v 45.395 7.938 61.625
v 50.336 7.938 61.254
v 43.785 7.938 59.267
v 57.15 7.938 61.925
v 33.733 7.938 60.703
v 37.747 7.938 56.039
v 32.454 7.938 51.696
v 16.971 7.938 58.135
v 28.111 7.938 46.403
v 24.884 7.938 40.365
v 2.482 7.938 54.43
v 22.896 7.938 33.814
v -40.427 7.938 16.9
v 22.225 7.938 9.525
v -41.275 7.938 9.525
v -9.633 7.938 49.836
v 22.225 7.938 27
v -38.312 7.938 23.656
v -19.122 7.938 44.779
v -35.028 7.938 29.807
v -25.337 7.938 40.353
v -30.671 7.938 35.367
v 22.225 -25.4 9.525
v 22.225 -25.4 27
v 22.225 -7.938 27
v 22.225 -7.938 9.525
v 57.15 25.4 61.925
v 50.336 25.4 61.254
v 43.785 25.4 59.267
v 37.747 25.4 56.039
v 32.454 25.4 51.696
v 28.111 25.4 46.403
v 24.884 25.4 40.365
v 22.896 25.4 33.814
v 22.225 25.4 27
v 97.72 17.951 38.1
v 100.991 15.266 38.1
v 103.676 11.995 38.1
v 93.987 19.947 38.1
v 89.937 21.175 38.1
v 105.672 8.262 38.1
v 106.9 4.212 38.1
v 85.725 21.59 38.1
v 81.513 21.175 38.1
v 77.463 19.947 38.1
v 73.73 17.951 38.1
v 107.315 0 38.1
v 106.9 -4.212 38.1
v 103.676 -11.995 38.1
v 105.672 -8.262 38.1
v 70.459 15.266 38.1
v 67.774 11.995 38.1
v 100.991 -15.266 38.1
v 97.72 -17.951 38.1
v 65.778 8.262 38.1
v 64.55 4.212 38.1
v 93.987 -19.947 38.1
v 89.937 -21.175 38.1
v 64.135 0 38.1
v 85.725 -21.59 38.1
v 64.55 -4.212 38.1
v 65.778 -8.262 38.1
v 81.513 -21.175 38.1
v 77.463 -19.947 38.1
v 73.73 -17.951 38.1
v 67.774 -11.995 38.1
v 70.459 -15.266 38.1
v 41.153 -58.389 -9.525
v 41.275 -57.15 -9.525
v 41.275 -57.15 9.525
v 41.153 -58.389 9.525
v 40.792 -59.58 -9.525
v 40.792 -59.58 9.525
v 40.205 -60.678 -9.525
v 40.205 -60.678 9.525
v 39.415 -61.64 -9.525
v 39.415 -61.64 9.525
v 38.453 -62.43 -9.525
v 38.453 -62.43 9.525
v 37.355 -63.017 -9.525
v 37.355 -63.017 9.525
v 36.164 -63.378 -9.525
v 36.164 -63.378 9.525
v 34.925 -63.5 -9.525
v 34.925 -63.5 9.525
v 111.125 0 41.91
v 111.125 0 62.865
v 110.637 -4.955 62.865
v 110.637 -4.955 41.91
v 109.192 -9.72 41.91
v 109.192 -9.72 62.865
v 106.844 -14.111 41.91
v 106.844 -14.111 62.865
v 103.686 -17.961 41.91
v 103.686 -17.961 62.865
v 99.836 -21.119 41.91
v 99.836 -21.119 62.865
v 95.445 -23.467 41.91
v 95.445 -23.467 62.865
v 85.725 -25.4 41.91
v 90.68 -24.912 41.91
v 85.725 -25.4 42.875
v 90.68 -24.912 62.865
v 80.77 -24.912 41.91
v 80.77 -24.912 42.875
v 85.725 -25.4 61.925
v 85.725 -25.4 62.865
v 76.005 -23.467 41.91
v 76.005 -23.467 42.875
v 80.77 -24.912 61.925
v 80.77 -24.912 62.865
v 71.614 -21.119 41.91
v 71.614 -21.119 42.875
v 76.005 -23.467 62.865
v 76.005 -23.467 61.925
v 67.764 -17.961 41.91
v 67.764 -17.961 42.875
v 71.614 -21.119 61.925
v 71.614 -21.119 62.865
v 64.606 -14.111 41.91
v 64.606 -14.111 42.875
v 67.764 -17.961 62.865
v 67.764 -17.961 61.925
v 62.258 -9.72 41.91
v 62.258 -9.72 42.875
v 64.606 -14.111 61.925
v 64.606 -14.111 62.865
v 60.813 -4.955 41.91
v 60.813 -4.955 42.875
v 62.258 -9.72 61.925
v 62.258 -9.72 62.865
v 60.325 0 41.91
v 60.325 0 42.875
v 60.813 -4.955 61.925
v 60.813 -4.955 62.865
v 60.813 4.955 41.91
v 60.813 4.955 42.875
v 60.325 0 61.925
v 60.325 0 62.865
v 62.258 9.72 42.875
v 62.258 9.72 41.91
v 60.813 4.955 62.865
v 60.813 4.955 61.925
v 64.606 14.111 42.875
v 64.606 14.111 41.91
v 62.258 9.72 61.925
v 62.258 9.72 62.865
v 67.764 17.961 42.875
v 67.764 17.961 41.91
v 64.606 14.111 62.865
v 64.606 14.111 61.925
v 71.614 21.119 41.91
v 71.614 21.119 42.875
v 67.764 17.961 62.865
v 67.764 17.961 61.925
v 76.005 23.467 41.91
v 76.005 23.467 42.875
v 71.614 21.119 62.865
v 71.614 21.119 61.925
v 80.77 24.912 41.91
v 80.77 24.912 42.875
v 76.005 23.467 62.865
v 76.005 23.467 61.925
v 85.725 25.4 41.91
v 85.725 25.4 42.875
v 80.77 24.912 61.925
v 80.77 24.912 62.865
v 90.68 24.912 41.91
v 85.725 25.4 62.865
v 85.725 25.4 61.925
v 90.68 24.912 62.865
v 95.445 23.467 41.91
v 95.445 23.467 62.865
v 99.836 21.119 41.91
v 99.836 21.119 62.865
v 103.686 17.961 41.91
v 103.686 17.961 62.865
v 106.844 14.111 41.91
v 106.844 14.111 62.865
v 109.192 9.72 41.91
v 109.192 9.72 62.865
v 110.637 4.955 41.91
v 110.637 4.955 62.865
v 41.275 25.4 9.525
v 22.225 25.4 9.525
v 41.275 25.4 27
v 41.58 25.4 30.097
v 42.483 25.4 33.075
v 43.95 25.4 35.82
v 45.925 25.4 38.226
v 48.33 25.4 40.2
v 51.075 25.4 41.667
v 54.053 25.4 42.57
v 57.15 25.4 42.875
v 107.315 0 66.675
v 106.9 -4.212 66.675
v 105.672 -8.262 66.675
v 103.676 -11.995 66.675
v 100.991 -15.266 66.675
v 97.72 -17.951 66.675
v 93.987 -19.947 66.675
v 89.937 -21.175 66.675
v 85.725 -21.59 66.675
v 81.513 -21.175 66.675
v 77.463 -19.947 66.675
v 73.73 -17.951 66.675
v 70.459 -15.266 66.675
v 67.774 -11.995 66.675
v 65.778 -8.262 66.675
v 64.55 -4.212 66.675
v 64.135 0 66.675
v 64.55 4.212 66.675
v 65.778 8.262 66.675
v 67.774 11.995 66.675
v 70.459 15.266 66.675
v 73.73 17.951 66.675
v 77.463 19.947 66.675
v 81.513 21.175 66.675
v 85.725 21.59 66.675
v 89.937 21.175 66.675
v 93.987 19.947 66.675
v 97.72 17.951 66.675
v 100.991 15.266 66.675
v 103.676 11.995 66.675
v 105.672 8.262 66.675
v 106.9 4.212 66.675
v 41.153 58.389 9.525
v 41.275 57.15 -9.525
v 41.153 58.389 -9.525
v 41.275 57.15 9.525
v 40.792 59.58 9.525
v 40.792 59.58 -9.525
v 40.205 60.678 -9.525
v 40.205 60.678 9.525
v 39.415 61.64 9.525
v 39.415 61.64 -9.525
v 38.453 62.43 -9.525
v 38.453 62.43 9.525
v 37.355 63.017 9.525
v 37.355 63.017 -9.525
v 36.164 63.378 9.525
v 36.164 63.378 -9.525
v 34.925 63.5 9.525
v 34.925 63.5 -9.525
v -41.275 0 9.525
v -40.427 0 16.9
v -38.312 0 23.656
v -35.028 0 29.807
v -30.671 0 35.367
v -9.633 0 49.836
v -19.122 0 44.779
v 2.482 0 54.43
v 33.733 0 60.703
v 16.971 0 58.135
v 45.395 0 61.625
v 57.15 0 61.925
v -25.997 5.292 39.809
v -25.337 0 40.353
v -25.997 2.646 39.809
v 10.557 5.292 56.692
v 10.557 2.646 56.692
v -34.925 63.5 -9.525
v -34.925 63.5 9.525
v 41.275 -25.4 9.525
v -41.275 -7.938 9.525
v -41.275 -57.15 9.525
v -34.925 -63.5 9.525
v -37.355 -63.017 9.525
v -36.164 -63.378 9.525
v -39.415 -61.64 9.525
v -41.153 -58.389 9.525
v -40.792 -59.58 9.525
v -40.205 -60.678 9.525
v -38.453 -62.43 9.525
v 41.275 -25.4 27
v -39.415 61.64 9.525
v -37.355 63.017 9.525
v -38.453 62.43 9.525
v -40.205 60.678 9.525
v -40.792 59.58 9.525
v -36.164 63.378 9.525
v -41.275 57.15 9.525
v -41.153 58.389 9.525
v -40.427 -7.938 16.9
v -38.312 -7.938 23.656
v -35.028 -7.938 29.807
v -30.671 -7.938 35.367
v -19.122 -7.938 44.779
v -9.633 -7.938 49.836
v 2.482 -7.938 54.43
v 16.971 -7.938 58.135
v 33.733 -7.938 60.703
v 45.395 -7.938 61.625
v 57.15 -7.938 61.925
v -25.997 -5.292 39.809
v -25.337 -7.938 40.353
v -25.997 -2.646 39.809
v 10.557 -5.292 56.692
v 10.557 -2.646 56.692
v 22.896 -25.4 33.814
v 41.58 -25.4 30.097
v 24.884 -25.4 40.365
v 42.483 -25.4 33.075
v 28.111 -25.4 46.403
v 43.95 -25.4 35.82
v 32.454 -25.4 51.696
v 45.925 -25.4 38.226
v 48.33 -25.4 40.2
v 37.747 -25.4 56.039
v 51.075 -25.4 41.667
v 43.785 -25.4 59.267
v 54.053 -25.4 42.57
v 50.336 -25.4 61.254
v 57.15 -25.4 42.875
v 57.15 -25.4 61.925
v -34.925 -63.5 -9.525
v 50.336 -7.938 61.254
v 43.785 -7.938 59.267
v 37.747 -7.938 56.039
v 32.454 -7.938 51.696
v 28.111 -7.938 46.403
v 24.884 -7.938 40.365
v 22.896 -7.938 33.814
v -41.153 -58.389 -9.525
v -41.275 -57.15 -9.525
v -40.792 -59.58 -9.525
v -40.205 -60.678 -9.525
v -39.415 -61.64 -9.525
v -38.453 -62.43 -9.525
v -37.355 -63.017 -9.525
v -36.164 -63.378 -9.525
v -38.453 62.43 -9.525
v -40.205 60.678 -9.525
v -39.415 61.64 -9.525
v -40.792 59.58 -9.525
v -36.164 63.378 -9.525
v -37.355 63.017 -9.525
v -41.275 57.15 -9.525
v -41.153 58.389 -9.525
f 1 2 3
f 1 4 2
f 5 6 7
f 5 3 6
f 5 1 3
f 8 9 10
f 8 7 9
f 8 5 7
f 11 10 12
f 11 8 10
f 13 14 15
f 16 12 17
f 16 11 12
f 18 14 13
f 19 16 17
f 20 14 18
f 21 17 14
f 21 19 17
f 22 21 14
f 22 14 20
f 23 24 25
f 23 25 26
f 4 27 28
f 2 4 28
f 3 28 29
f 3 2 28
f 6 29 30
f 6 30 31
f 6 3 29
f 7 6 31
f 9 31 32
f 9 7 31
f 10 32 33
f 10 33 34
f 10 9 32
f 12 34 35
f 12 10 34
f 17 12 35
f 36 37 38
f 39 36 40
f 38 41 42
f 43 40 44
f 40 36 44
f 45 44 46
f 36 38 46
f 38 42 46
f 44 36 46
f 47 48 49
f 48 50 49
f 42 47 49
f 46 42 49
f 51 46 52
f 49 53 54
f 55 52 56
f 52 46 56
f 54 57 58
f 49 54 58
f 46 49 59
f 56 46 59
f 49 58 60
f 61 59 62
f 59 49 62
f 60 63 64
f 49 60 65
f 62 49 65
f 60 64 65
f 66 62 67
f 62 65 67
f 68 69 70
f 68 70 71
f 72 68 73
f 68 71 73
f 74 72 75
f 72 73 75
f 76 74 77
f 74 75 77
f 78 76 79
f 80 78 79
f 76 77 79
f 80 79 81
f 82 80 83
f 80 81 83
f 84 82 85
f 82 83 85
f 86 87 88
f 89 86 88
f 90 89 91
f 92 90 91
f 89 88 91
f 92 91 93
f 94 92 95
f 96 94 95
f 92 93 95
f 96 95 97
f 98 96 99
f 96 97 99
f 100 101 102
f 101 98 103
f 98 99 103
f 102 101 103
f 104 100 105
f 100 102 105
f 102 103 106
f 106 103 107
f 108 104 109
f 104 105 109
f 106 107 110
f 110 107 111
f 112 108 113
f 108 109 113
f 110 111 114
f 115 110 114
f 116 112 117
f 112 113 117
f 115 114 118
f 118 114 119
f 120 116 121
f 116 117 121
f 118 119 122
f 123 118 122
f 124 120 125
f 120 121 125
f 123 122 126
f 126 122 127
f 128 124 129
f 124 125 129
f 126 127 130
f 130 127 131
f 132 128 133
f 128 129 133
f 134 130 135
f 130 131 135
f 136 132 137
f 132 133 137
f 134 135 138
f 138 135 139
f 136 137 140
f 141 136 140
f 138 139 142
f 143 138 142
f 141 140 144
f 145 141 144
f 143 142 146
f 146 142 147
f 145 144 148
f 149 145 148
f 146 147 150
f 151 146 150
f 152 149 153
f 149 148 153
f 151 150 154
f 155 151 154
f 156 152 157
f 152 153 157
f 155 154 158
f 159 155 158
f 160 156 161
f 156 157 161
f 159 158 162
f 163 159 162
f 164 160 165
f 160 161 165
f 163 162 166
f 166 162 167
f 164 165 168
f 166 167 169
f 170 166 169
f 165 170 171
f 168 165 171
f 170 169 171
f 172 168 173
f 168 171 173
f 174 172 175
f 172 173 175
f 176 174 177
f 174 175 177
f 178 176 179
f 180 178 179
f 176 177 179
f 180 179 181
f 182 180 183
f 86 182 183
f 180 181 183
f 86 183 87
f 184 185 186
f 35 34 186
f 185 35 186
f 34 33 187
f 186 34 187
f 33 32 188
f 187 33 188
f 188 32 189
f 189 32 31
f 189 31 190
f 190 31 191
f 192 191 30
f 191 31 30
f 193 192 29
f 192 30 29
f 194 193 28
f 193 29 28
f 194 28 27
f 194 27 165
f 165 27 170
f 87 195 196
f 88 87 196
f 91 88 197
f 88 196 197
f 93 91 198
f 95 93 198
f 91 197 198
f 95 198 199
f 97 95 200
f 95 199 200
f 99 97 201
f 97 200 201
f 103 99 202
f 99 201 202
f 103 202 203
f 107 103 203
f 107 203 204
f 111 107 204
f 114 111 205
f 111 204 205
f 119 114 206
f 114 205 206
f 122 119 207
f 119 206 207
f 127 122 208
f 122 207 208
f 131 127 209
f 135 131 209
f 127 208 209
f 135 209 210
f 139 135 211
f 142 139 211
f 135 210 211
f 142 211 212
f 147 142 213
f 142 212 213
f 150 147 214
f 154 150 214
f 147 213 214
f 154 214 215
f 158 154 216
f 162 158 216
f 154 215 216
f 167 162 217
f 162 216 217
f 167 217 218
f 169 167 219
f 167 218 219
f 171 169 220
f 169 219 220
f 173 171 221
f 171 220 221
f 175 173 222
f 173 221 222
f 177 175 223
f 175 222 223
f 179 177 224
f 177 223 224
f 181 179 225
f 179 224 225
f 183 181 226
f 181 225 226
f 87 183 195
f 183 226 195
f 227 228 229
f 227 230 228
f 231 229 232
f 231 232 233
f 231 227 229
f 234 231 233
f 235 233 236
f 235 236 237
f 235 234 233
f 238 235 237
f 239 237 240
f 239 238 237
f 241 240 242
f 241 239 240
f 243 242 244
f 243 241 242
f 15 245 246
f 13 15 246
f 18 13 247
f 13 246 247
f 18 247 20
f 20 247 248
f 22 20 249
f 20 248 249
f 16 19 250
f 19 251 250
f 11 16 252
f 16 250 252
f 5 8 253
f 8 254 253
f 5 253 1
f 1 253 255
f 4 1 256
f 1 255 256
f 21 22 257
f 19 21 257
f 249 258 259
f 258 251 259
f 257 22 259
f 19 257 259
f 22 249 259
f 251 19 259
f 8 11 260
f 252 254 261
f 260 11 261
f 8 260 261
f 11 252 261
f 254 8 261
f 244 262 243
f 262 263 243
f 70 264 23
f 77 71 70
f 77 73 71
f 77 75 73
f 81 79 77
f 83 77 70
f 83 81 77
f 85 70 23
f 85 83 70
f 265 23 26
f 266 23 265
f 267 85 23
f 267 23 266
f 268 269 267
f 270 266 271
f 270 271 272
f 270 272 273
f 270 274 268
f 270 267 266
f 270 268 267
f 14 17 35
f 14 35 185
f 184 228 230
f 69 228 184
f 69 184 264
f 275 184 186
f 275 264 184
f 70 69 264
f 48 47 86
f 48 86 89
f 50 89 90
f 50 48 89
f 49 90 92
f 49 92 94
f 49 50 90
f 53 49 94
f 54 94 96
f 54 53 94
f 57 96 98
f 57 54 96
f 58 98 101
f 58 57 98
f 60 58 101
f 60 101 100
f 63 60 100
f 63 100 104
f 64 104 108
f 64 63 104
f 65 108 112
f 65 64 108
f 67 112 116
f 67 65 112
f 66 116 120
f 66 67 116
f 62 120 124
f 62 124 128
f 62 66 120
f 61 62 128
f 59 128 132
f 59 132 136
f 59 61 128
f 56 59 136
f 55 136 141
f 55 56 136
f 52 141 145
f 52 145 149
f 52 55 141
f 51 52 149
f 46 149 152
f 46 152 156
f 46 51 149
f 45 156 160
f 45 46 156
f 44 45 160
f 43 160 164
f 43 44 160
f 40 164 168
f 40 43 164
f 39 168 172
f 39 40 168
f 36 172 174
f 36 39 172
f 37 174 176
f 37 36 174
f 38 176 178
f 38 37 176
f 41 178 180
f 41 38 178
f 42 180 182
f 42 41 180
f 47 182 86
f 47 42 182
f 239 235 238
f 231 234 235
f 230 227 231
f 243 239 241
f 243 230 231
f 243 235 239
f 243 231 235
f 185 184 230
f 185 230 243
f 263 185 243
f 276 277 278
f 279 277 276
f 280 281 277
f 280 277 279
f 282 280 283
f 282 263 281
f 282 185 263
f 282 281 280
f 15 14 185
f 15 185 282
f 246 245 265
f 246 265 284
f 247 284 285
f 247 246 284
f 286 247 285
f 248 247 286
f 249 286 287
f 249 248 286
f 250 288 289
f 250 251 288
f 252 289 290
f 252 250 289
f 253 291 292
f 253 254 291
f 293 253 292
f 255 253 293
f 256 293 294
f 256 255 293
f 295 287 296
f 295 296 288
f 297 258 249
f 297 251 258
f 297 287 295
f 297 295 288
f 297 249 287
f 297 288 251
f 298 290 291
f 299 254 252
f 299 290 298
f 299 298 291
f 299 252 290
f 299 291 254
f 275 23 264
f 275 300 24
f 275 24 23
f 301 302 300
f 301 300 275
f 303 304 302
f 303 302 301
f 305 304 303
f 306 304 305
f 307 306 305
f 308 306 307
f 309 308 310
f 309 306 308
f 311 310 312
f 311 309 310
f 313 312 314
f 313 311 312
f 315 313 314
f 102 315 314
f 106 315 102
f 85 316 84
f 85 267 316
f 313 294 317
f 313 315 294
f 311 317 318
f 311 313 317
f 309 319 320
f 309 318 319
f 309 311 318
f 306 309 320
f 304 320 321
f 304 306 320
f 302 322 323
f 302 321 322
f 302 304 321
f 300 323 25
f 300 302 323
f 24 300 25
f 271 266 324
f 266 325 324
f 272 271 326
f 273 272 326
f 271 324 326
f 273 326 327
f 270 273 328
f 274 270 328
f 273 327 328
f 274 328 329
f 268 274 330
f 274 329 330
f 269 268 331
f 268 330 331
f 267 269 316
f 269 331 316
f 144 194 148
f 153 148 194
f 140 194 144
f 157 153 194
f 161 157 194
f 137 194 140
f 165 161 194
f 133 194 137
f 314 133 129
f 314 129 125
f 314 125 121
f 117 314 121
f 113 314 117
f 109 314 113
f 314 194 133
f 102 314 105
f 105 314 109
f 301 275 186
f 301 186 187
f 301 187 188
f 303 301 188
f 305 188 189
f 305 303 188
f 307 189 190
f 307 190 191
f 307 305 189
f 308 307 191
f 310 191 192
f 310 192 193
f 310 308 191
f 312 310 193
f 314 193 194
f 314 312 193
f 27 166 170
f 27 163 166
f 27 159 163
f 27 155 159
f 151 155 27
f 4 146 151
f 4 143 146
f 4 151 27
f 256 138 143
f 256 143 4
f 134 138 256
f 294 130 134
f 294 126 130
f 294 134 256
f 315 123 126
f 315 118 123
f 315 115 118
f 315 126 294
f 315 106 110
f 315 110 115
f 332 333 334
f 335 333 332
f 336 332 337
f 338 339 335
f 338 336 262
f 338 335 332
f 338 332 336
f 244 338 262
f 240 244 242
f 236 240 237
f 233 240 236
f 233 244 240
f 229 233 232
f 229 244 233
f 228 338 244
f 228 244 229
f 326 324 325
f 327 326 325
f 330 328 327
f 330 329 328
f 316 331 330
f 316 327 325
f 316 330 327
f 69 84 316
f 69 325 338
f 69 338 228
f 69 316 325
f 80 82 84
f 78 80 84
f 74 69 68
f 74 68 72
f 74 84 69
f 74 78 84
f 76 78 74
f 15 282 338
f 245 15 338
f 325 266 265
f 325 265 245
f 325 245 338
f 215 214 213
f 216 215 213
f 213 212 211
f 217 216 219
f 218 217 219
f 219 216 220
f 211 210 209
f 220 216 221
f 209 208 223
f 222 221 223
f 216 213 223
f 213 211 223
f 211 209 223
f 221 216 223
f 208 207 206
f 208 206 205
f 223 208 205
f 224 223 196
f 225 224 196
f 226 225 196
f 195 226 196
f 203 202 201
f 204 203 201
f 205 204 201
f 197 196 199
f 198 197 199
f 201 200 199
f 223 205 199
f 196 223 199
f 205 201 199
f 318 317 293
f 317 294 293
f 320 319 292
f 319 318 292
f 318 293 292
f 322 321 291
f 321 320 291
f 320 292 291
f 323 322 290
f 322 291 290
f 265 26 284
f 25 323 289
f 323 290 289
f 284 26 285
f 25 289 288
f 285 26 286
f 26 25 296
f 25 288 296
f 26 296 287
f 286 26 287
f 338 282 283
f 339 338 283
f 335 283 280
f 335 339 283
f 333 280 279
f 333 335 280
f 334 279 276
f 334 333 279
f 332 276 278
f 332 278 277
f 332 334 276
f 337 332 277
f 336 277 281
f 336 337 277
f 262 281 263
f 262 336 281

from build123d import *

# Parameters (mm, degrees)
F1_DEPTH = 63.5
F0_W     = 25.4
F0_H     = 19.05
F2_DEPTH = 25.4
F3_DEPTH = 7.9375
F5_R     = 6.35
F6_SIZE  = 3.81


with BuildPart() as f1:
    # F0 (on Front) → F1 (new body, symmetric)
    with BuildSketch(Plane.XZ):
        Polygon((-41.275, -9.525), (41.275, -9.525), (41.275, 9.525), (22.225, 9.525), (-41.275, 9.525), align=None)
    extrude(amount=F1_DEPTH, both=True)

    # F0 (on Front) → F2 (join, symmetric)
    with BuildSketch(Plane.XZ):
        with BuildLine():
            Line((22.225, 9.525), (41.275, 9.525))
            Line((41.275, 9.525), (41.275, 27.0002))
            ThreePointArc((41.275, 27.0002), (45.9246798487, 38.2255201513), (57.15, 42.8752))
            Line((57.15, 42.8752), (60.325, 42.8752))
            Line((60.325, 42.8752), (60.325, 61.9252))
            Line((60.325, 61.9252), (57.15, 61.9252))
            ThreePointArc((57.15, 61.9252), (32.4542956671, 51.6959043329), (22.225, 27.0002))
            Line((22.225, 27.0002), (22.225, 9.525))
        make_face()
        with Locations((73.025, 52.4002)):
            Rectangle(F0_W, F0_H)
    extrude(amount=F2_DEPTH, both=True)

    # F0 (on Front) → F3 (join, symmetric)
    with BuildSketch(Plane.XZ):
        with BuildLine():
            add(Edge.make_bspline(
                [(-41.275, 9.525), (-40.3791815042, 47.0926873386), (9.2821996659, 61.9340203702), (57.15, 61.9252)],
                knots=[0, 0, 0, 0, 111.5045361635, 111.5045361635, 111.5045361635, 111.5045361635], degree=3))
            Line((-41.275, 9.525), (22.225, 9.525))
            Line((22.225, 9.525), (22.225, 27.0002))
            ThreePointArc((22.225, 27.0002), (32.4542956671, 51.6959043329), (57.15, 61.9252))
        make_face()
    extrude(amount=F3_DEPTH, both=True)

    # F0 (on Front) → F4 (revolve)
    with BuildSketch(Plane.XZ):
        Polygon((85.725, 66.675), (85.725, 61.9252), (85.725, 42.8752), (85.725, 38.1), (111.125, 38.1), (111.125, 66.675), align=None)
    revolve(axis=Axis((85.725, 0, 52.3875), (0, 0, -1)))

    # F5
    f5_edges = [f1.edges().sort_by_distance(p)[0] for p in [
        (41.275, 63.5, 0),
        (-41.275, 63.5, 0),
        (41.275, -63.5, 0),
        (-41.275, -63.5, 0),
    ]]
    fillet(f5_edges, radius=F5_R)

    # F6
    f6_edges = [f1.edges().sort_by_distance(p)[0] for p in [
        (60.325, 0, 66.675),
        (60.325, 0, 38.1),
    ]]
    chamfer(f6_edges, length=F6_SIZE)


solid = f1.part
